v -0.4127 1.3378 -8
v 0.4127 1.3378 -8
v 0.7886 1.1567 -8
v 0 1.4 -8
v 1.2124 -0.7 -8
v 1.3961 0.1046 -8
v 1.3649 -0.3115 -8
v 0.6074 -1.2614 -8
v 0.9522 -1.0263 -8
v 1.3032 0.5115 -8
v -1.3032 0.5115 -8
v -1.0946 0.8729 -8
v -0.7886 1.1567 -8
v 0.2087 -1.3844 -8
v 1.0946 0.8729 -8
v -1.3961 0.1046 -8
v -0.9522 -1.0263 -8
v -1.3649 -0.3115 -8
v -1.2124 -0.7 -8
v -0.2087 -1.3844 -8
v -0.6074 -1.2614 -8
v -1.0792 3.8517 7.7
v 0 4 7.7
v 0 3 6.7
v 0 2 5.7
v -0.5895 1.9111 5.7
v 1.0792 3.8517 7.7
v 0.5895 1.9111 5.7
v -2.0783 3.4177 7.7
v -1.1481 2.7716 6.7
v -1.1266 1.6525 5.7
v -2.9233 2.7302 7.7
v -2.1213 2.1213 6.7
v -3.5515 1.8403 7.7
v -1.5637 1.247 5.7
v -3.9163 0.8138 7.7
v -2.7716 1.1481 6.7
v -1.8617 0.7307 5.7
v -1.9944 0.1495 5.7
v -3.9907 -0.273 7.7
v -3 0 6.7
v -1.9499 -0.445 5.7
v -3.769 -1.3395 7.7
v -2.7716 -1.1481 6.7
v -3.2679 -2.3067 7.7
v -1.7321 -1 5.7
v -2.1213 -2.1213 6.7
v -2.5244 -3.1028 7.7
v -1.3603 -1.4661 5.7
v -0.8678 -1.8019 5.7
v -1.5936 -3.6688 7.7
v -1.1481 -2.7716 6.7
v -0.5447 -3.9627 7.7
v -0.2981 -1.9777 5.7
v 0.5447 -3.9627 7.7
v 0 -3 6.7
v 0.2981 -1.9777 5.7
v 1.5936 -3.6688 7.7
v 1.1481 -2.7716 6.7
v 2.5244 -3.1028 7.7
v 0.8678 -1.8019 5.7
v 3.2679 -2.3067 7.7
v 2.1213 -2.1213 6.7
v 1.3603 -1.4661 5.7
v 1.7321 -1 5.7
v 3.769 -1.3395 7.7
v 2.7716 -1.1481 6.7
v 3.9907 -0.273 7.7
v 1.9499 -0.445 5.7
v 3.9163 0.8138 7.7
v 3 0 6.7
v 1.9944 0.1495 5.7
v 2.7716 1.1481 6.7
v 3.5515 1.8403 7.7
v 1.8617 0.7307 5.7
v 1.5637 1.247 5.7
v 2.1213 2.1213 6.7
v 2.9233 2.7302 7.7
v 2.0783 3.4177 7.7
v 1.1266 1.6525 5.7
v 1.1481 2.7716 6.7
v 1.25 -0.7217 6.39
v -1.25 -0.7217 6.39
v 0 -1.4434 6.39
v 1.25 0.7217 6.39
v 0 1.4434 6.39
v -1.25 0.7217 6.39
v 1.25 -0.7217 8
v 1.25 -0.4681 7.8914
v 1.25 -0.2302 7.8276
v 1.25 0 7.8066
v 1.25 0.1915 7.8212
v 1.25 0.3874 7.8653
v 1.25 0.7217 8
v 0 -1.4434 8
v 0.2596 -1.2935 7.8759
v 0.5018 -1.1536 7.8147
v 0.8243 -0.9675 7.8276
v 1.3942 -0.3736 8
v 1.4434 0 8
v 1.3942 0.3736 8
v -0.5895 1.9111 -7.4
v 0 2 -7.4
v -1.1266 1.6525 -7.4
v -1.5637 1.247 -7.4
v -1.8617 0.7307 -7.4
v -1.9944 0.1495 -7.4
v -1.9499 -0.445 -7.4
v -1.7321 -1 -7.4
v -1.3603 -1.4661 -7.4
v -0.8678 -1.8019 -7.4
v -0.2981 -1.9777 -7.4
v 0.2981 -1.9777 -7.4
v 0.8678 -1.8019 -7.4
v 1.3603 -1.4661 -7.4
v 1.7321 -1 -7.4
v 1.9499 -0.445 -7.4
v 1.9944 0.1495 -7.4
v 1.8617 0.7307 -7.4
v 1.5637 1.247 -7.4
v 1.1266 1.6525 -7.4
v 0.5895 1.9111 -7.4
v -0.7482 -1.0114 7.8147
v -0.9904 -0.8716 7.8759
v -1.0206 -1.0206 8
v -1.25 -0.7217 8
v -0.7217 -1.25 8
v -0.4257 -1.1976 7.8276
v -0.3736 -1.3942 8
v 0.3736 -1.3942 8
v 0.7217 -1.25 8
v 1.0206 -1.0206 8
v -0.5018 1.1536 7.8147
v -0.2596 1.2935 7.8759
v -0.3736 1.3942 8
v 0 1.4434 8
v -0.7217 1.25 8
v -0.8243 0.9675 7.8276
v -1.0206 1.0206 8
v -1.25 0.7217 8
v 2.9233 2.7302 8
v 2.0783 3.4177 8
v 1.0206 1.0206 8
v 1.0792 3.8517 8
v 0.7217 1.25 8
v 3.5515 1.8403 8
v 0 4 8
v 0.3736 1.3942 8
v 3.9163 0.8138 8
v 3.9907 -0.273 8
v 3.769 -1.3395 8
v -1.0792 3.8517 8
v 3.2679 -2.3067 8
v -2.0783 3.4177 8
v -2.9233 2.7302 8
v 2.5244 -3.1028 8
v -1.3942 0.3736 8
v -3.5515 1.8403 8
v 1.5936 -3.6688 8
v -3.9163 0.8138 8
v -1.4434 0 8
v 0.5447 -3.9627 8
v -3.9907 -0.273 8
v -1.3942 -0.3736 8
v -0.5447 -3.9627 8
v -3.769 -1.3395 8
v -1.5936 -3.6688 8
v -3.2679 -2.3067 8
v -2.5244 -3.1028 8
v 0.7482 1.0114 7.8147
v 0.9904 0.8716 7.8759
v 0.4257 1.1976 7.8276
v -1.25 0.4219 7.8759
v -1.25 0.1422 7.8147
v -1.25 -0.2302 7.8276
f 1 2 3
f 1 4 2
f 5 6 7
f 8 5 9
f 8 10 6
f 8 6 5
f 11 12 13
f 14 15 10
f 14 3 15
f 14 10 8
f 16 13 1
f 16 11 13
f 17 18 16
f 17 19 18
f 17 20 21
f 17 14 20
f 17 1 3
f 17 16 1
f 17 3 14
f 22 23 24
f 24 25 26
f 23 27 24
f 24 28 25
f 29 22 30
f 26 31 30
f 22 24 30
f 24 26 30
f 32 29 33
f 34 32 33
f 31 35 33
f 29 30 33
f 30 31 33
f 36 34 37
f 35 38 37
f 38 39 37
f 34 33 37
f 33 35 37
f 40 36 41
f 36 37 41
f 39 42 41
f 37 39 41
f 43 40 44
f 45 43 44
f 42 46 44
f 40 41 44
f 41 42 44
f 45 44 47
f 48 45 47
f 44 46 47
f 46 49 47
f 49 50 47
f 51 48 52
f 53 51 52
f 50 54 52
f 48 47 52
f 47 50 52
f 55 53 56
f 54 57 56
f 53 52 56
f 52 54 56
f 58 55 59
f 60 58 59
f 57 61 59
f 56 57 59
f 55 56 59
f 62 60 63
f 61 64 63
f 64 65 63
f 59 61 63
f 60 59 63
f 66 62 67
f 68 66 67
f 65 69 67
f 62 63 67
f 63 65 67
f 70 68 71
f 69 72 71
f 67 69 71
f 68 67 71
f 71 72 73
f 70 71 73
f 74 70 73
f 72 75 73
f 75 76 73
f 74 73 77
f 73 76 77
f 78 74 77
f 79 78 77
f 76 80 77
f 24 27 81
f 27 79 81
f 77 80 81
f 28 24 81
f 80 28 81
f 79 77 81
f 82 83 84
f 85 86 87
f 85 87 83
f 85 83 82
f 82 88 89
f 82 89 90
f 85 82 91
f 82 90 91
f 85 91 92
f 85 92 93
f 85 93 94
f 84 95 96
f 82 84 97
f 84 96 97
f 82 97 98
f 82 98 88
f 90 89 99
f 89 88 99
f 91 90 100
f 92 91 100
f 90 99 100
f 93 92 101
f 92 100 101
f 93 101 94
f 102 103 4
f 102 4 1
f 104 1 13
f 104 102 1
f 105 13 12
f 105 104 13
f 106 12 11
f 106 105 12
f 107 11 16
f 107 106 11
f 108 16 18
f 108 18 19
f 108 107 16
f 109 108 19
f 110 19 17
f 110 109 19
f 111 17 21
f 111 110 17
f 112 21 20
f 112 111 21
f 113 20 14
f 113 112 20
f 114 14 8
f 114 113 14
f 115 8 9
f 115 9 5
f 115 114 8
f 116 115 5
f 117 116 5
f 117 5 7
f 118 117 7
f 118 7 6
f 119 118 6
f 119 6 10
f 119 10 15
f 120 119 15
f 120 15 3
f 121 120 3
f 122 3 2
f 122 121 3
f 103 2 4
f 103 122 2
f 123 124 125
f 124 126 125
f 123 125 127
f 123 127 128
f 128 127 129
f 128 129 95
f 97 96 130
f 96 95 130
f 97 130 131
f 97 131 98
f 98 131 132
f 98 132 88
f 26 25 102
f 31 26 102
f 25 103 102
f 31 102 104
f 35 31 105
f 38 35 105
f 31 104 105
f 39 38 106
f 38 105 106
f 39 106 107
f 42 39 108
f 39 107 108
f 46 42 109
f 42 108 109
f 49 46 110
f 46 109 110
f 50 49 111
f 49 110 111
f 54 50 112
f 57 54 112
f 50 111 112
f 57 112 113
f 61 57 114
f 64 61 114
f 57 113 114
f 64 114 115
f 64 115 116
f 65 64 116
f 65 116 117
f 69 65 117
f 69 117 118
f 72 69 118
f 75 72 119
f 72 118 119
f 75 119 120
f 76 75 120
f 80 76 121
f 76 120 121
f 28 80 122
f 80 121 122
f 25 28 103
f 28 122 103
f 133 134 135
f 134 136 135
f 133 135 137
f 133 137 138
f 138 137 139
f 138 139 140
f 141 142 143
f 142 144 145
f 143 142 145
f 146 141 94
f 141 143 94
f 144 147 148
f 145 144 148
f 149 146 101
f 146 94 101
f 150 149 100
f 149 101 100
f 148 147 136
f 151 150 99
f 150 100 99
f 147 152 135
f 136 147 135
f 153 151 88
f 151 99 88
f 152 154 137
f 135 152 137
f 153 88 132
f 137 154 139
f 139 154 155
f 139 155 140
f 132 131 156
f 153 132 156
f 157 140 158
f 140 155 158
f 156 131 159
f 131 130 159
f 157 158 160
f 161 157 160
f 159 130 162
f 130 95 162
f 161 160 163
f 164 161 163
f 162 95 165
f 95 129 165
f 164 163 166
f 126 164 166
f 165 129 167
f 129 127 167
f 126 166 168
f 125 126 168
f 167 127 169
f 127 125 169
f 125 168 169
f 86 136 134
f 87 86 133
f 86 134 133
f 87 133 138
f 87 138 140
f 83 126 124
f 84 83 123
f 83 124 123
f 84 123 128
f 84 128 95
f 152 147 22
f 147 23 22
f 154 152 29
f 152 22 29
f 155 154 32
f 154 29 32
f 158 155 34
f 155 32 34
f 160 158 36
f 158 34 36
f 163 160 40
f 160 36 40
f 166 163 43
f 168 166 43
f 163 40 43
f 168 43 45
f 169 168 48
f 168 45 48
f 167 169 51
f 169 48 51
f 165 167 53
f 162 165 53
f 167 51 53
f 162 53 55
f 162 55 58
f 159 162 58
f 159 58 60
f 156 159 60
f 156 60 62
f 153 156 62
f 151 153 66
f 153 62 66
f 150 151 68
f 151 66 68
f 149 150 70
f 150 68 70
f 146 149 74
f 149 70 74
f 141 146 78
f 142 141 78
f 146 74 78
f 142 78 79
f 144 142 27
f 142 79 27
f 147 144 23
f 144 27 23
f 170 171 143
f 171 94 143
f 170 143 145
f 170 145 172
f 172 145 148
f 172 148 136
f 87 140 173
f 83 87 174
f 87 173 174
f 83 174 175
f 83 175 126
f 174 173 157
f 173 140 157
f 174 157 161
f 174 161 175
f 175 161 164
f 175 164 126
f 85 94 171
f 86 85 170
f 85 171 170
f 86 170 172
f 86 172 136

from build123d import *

# Parameters (mm, degrees)
SKETCH3_W          = 16
SKETCH3_H          = 2
CHAMFER1_SIZE      = 0.6
CUT_EXTRUDE1_DEPTH = 1.61
SKETCH9_R          = 1.443375673
CUT_EXTRUDE2_DEPTH = 1.61
CUT_EXTRUDE2_DRAFT = -45


with BuildPart() as part:
    # Sketch3 → Revolve1 (revolve)
    with BuildSketch(Plane(origin=(0, 0, 0), x_dir=(0, 0, -1), z_dir=(1, 0, 0))):
        with Locations((0, 1)):
            Rectangle(SKETCH3_W, SKETCH3_H)
    revolve(axis=Axis((0, 0, -8), (0, 0, 1)))

    # Chamfer1
    chamfer1_edges = [part.edges().sort_by_distance(p)[0] for p in [
        (0, -2, -8),
    ]]
    chamfer(chamfer1_edges, length=CHAMFER1_SIZE)

    # Sketch6 → Revolve2 (revolve)
    with BuildSketch(Plane(origin=(0, 0, 0), x_dir=(0, 0, -1), z_dir=(1, 0, 0))):
        Polygon((-8, 4), (-7.7, 4), (-5.7, 2), (-5.7, 0), (-8, 0), align=None)
    revolve(axis=Axis((0, 0, -8), (0, 0, 1)))

    # Sketch8 → Cut-Extrude1 (cut)
    with BuildSketch(Plane.XY.offset(8)):
        Polygon((0, 1.443375673), (-1.25, 0.721687836), (-1.25, -0.721687836), (0, -1.443375673), (1.25, -0.721687836), (1.25, 0.721687836), align=None)
    extrude(amount=-CUT_EXTRUDE1_DEPTH, mode=Mode.SUBTRACT)


with BuildPart() as cut_extrude2_tool:
    # Sketch9 → Cut-Extrude2 (with draft: the straight prism first)
    with BuildSketch(Plane.XY.offset(8)):
        Circle(SKETCH9_R)
    extrude(amount=-CUT_EXTRUDE2_DEPTH)
    # Cut-Extrude2: the draft: its side faces are tilted about the plane it starts from
    cut_extrude2_sides = [cut_extrude2_tool.faces().sort_by_distance(p)[0] for p in [
        (-1.443375673, 0, 7.195),
    ]]
    draft(cut_extrude2_sides, Plane.XY.offset(8), CUT_EXTRUDE2_DRAFT)


with BuildPart() as part_1:
    add(part.part)

    # Cut-Extrude2: cut by cut_extrude2_tool
    add(cut_extrude2_tool.part, mode=Mode.SUBTRACT)


solid = part_1.part
